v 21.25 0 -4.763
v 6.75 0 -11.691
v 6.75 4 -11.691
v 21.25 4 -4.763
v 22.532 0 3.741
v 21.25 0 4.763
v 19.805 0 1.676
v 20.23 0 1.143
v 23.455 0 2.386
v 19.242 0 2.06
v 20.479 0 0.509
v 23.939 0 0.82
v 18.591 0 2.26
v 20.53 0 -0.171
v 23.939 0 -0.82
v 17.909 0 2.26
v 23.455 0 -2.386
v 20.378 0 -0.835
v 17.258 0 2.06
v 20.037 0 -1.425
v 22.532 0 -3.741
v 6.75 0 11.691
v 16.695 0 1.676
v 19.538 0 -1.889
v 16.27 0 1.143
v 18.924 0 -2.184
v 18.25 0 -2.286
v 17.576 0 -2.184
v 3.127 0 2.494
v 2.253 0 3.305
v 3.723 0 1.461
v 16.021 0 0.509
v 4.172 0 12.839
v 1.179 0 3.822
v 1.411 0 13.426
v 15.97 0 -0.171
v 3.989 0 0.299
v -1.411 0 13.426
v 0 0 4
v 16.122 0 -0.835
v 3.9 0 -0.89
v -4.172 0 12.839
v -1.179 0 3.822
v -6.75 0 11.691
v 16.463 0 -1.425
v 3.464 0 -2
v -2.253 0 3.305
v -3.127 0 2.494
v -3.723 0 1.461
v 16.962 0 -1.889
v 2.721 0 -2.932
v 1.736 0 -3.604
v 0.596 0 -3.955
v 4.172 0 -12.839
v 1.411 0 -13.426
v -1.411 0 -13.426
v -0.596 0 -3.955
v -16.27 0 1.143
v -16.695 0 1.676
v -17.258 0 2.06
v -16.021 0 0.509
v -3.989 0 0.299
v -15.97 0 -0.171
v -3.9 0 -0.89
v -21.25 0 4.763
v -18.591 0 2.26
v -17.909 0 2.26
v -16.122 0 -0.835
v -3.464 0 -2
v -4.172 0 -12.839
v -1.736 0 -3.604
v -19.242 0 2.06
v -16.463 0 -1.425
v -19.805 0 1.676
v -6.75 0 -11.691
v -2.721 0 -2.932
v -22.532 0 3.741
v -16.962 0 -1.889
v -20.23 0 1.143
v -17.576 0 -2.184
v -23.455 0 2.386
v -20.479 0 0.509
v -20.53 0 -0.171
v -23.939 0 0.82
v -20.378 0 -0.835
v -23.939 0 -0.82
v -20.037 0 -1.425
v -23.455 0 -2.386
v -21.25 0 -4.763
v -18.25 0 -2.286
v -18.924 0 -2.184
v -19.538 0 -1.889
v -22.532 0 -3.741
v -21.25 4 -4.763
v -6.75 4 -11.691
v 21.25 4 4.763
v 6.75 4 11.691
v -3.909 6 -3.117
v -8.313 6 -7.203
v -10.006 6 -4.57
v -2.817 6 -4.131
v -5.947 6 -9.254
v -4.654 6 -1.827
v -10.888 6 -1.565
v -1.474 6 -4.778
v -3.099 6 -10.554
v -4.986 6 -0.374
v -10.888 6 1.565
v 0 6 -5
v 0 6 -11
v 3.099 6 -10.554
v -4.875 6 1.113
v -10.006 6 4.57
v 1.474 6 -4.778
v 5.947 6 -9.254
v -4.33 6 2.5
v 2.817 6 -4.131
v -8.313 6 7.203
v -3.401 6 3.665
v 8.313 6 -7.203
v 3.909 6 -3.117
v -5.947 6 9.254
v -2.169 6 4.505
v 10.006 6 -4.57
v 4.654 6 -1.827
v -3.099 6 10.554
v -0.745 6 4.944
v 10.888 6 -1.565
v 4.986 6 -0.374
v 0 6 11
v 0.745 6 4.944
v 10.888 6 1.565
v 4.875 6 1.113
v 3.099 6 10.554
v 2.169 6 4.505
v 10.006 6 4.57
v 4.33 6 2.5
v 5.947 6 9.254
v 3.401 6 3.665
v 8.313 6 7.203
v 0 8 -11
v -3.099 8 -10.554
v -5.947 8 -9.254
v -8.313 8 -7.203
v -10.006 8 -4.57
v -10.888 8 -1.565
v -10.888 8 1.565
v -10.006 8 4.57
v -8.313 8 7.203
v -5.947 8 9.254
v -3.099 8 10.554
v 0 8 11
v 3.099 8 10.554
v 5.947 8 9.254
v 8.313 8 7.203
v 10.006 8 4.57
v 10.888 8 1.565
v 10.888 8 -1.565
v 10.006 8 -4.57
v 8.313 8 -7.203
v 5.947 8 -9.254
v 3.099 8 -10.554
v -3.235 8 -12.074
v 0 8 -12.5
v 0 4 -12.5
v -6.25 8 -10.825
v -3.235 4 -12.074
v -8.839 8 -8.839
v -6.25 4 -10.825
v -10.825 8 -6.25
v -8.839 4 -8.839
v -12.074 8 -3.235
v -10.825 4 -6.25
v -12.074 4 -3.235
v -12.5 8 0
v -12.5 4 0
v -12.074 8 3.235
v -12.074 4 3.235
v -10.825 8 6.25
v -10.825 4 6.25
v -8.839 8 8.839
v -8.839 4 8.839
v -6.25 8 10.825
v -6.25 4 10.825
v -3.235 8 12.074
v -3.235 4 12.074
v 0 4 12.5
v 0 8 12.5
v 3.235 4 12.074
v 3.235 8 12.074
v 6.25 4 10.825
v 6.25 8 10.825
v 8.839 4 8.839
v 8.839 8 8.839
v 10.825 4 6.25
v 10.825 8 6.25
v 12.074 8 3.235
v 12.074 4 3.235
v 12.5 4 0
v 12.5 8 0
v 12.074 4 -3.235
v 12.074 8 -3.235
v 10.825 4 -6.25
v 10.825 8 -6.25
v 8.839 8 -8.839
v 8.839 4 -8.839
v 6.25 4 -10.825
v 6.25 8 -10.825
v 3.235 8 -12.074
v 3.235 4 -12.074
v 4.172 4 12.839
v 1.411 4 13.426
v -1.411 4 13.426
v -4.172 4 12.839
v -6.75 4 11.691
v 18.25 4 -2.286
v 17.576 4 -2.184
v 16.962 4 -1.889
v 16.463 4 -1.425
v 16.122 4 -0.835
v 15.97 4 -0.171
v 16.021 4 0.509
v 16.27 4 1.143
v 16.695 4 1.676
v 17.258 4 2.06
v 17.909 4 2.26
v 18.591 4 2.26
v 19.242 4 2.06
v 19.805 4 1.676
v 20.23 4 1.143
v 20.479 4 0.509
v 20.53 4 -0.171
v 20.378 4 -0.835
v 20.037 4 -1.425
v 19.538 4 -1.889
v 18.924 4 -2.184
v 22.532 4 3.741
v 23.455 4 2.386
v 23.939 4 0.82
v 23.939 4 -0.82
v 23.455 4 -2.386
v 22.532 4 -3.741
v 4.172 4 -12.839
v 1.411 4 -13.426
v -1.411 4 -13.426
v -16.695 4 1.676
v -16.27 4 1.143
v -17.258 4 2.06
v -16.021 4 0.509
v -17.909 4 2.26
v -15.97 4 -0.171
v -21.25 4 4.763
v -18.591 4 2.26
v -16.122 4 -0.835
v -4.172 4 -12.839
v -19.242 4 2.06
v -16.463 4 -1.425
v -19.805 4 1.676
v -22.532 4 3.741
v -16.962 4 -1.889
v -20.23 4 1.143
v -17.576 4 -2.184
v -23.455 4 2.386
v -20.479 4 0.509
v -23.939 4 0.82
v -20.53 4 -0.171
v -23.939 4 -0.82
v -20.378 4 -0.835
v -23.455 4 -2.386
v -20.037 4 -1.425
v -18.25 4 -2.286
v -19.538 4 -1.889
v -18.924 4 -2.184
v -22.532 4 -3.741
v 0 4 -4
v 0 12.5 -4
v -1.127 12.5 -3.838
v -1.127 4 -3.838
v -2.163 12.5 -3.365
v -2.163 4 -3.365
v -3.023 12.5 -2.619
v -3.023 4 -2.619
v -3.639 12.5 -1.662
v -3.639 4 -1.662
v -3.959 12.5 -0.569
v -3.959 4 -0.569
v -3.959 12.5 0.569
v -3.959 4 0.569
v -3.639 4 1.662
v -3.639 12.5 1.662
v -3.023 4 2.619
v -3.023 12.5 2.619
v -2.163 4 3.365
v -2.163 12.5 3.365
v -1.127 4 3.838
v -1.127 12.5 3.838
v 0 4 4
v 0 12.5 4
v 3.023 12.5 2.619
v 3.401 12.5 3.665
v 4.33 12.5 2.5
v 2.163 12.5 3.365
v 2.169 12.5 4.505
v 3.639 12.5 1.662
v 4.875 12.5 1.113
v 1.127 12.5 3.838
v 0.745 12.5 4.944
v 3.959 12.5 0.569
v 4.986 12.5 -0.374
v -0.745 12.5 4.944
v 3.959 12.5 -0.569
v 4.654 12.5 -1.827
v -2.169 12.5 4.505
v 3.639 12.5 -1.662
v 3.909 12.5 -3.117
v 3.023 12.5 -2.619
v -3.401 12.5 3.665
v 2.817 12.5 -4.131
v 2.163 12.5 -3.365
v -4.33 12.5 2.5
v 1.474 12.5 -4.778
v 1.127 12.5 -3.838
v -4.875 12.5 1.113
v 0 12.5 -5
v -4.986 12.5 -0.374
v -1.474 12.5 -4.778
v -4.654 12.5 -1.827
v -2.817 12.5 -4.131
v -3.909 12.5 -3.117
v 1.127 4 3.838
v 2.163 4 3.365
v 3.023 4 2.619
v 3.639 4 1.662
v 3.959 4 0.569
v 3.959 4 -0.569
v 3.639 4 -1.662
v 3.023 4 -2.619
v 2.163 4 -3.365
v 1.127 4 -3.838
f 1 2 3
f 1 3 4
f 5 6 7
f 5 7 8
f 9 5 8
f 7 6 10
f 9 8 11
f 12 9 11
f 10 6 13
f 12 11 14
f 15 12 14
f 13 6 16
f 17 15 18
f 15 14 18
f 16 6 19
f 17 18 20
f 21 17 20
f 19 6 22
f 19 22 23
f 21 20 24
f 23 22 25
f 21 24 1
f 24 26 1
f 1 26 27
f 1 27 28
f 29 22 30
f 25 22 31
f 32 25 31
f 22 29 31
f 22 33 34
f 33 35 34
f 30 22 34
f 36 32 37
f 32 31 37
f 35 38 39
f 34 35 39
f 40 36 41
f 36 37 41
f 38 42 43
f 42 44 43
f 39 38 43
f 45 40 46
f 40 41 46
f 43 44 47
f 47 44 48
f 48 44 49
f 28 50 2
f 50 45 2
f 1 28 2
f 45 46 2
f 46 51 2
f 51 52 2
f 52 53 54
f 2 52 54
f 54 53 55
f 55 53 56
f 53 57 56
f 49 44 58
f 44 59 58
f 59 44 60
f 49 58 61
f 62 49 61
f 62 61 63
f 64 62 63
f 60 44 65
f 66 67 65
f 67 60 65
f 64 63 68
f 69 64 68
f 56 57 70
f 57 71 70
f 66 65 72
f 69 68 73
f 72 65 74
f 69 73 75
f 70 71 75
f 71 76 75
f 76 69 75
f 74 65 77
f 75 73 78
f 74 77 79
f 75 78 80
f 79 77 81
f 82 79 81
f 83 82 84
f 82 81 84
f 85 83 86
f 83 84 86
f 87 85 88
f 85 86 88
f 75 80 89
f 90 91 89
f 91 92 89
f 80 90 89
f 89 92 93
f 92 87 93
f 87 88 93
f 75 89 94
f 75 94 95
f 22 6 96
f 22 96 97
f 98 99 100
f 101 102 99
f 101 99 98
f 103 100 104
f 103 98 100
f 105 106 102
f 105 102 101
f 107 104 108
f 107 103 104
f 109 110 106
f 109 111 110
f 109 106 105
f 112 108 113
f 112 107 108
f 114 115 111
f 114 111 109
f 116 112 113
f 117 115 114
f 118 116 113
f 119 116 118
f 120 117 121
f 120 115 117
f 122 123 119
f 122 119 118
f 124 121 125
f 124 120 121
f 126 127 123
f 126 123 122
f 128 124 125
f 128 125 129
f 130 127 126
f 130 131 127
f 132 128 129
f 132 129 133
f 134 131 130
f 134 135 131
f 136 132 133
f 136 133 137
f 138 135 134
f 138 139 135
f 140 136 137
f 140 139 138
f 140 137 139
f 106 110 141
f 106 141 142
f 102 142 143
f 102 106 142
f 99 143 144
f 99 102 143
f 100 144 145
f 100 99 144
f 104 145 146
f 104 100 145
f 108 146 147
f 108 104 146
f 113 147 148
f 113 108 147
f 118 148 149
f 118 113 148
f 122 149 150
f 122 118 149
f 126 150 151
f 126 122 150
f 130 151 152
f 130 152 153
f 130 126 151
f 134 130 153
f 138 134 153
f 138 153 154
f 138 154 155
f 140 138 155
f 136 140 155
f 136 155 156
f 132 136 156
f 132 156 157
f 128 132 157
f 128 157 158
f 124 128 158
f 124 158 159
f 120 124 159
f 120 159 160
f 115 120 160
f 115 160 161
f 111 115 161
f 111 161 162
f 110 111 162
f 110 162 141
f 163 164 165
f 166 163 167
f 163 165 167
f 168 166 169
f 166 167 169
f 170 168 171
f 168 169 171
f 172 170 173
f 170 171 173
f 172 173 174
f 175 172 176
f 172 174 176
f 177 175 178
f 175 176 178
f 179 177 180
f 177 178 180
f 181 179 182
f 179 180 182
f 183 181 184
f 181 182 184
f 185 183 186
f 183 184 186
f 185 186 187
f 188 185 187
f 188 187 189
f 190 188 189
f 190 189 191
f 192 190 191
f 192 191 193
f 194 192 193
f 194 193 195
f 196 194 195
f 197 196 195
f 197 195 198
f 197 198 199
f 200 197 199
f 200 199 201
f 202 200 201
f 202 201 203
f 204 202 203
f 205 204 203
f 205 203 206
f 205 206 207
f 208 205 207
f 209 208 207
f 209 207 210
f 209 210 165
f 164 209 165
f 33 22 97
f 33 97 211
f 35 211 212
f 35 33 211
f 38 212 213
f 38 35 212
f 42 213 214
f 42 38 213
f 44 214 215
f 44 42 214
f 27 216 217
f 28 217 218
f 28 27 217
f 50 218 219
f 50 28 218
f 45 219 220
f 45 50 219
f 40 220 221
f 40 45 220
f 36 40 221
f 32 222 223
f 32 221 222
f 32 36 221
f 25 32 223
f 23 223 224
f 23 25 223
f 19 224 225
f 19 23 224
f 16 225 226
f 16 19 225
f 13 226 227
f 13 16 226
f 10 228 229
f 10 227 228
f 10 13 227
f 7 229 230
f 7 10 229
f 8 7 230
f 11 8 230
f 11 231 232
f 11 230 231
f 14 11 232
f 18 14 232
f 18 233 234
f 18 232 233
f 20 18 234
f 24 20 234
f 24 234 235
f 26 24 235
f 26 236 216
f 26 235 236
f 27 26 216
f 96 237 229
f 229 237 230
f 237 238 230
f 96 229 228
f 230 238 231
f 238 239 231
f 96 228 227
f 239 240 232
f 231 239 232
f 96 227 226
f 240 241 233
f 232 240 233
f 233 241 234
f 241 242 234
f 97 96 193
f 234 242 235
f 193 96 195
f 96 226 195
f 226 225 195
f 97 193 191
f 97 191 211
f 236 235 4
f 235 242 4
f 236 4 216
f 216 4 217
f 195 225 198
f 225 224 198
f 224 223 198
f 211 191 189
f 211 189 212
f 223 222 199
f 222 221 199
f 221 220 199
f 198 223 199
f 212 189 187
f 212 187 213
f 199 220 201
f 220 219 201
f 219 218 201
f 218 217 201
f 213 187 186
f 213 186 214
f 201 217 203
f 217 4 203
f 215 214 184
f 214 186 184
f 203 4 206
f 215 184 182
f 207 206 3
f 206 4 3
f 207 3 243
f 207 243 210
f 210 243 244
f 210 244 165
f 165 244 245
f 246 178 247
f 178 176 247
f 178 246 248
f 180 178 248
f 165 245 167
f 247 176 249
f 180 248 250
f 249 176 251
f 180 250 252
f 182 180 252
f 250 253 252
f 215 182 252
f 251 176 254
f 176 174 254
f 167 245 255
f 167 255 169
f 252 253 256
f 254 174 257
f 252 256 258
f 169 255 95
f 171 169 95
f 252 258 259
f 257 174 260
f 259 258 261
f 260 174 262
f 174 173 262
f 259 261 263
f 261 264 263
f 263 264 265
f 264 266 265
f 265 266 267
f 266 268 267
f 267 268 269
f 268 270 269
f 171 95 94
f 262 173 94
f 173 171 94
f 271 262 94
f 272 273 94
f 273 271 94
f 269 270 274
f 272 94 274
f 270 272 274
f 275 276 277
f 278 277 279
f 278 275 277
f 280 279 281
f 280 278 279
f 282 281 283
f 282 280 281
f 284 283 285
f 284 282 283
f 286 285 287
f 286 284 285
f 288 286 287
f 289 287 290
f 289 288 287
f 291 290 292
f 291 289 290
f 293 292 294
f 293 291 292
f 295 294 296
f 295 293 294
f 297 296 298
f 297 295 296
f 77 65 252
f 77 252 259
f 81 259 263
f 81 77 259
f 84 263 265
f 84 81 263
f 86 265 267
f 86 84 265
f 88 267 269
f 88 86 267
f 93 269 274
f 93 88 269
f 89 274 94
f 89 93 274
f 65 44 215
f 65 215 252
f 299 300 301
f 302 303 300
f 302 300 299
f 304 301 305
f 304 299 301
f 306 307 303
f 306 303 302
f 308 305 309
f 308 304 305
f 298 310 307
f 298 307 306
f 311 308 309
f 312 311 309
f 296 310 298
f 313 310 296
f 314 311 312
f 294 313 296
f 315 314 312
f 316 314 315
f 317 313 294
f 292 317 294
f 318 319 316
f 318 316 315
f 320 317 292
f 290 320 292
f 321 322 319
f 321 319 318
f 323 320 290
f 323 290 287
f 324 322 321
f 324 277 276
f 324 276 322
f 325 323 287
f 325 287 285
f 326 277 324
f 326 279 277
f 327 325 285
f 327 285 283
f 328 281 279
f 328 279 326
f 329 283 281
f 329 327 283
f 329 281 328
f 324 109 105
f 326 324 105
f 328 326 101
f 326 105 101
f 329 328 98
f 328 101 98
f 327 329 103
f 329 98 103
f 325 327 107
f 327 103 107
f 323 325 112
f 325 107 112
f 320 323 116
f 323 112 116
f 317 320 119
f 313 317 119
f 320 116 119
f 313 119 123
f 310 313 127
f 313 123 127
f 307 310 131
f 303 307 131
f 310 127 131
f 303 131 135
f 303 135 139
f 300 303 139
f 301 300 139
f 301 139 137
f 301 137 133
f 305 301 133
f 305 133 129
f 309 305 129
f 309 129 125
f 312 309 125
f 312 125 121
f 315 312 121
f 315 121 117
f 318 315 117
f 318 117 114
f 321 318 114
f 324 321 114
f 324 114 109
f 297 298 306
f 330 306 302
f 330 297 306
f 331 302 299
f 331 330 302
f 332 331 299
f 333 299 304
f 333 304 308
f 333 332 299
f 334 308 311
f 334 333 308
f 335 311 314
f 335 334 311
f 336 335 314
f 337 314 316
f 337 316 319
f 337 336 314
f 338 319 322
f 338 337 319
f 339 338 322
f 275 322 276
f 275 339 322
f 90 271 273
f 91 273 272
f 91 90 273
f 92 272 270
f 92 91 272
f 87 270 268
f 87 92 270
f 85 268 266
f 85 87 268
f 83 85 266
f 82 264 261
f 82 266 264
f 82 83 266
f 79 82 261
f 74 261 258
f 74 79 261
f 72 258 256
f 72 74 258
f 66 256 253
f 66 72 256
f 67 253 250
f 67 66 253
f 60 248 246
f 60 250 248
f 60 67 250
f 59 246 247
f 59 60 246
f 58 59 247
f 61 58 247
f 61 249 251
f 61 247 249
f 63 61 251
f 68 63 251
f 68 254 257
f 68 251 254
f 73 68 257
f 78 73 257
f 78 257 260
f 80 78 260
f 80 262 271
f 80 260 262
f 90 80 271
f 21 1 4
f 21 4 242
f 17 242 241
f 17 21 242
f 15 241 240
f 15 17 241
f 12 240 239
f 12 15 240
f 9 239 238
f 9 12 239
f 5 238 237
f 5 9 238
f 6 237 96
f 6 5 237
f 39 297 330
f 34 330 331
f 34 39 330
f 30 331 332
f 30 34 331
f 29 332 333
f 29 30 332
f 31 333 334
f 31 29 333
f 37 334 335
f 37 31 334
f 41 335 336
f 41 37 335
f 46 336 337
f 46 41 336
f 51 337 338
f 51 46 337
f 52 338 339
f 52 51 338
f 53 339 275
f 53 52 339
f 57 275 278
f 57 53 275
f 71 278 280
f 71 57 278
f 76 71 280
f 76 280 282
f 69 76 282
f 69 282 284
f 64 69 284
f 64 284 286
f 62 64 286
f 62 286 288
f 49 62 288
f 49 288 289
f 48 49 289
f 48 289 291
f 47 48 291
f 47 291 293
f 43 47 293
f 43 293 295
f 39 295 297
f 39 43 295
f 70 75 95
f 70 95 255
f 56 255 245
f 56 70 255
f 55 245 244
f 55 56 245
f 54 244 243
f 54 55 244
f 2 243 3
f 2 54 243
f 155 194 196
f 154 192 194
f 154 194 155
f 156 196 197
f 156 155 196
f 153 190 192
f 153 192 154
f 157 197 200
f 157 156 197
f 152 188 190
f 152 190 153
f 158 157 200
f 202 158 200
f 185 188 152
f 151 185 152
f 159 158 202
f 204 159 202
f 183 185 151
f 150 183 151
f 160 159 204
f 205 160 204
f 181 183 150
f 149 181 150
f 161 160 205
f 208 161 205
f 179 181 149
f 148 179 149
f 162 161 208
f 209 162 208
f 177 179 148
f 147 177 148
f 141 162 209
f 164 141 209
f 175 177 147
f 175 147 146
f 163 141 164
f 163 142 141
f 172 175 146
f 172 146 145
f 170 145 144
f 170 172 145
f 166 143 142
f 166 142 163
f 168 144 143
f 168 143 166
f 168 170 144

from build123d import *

# Parameters (mm, degrees)
BOSS_EXTRUDE1_DEPTH = 4
SKETCH1_3_R         = 12.5
SKETCH1_3_R_2       = 11
BOSS_EXTRUDE2_DEPTH = 8
SKETCH1_4_R         = 5
SKETCH1_4_R_2       = 4
BOSS_EXTRUDE3_DEPTH = 12.5
SKETCH3_R           = 11
SKETCH3_R_2         = 5
BOSS_EXTRUDE4_DEPTH = 2
SKETCH1_5_R         = 4
SKETCH1_5_R_2       = 2.285917385
CUT_EXTRUDE1_DEPTH  = 31.24070105


with BuildPart() as part:
    # Sketch1 → Boss-Extrude1 (new body)
    with BuildSketch(Plane(origin=(0, 0, 0), x_dir=(1, 0, 0), z_dir=(0, 1, 0))):
        with BuildLine():
            Line((-21.25, 4.763139721), (-6.75, 11.691342951))
            ThreePointArc((-6.75, 11.691342951), (0, 13.5), (6.75, 11.691342951))
            Line((6.75, 11.691342951), (21.25, 4.763139721))
            ThreePointArc((21.25, 4.763139721), (24, 0), (21.25, -4.763139721))
            Line((21.25, -4.763139721), (6.75, -11.691342951))
            ThreePointArc((6.75, -11.691342951), (0, -13.5), (-6.75, -11.691342951))
            Line((-6.75, -11.691342951), (-21.25, -4.763139721))
            ThreePointArc((-21.25, -4.763139721), (-24, 0), (-21.25, 4.763139721))
        make_face()
    extrude(amount=BOSS_EXTRUDE1_DEPTH)

    # Sketch1<3> → Boss-Extrude2 (add)
    with BuildSketch(Plane(origin=(0, 0, 0), x_dir=(1, 0, 0), z_dir=(0, 1, 0))):
        Circle(SKETCH1_3_R)
        Circle(SKETCH1_3_R_2, mode=Mode.SUBTRACT)
    extrude(amount=BOSS_EXTRUDE2_DEPTH)

    # Sketch1<4> → Boss-Extrude3 (add)
    with BuildSketch(Plane(origin=(0, 0, 0), x_dir=(1, 0, 0), z_dir=(0, 1, 0))):
        Circle(SKETCH1_4_R)
        Circle(SKETCH1_4_R_2, mode=Mode.SUBTRACT)
    extrude(amount=BOSS_EXTRUDE3_DEPTH)

    # Sketch3 → Boss-Extrude4 (add)
    with BuildSketch(Plane(origin=(0, 4, 0), x_dir=(1, 0, 0), z_dir=(0, 1, 0))):
        Circle(SKETCH3_R)
        Circle(SKETCH3_R_2, mode=Mode.SUBTRACT)
    extrude(amount=BOSS_EXTRUDE4_DEPTH)

    # Sketch1<5> → Cut-Extrude1 (cut, through all)
    with BuildSketch(Plane(origin=(0, 0, 0), x_dir=(1, 0, 0), z_dir=(0, 1, 0))):
        Circle(SKETCH1_5_R)
        with Locations((18.25, 0)):
            Circle(SKETCH1_5_R_2)
        with Locations((-18.25, 0)):
            Circle(SKETCH1_5_R_2)
    extrude(amount=CUT_EXTRUDE1_DEPTH, mode=Mode.SUBTRACT)


solid = part.part
